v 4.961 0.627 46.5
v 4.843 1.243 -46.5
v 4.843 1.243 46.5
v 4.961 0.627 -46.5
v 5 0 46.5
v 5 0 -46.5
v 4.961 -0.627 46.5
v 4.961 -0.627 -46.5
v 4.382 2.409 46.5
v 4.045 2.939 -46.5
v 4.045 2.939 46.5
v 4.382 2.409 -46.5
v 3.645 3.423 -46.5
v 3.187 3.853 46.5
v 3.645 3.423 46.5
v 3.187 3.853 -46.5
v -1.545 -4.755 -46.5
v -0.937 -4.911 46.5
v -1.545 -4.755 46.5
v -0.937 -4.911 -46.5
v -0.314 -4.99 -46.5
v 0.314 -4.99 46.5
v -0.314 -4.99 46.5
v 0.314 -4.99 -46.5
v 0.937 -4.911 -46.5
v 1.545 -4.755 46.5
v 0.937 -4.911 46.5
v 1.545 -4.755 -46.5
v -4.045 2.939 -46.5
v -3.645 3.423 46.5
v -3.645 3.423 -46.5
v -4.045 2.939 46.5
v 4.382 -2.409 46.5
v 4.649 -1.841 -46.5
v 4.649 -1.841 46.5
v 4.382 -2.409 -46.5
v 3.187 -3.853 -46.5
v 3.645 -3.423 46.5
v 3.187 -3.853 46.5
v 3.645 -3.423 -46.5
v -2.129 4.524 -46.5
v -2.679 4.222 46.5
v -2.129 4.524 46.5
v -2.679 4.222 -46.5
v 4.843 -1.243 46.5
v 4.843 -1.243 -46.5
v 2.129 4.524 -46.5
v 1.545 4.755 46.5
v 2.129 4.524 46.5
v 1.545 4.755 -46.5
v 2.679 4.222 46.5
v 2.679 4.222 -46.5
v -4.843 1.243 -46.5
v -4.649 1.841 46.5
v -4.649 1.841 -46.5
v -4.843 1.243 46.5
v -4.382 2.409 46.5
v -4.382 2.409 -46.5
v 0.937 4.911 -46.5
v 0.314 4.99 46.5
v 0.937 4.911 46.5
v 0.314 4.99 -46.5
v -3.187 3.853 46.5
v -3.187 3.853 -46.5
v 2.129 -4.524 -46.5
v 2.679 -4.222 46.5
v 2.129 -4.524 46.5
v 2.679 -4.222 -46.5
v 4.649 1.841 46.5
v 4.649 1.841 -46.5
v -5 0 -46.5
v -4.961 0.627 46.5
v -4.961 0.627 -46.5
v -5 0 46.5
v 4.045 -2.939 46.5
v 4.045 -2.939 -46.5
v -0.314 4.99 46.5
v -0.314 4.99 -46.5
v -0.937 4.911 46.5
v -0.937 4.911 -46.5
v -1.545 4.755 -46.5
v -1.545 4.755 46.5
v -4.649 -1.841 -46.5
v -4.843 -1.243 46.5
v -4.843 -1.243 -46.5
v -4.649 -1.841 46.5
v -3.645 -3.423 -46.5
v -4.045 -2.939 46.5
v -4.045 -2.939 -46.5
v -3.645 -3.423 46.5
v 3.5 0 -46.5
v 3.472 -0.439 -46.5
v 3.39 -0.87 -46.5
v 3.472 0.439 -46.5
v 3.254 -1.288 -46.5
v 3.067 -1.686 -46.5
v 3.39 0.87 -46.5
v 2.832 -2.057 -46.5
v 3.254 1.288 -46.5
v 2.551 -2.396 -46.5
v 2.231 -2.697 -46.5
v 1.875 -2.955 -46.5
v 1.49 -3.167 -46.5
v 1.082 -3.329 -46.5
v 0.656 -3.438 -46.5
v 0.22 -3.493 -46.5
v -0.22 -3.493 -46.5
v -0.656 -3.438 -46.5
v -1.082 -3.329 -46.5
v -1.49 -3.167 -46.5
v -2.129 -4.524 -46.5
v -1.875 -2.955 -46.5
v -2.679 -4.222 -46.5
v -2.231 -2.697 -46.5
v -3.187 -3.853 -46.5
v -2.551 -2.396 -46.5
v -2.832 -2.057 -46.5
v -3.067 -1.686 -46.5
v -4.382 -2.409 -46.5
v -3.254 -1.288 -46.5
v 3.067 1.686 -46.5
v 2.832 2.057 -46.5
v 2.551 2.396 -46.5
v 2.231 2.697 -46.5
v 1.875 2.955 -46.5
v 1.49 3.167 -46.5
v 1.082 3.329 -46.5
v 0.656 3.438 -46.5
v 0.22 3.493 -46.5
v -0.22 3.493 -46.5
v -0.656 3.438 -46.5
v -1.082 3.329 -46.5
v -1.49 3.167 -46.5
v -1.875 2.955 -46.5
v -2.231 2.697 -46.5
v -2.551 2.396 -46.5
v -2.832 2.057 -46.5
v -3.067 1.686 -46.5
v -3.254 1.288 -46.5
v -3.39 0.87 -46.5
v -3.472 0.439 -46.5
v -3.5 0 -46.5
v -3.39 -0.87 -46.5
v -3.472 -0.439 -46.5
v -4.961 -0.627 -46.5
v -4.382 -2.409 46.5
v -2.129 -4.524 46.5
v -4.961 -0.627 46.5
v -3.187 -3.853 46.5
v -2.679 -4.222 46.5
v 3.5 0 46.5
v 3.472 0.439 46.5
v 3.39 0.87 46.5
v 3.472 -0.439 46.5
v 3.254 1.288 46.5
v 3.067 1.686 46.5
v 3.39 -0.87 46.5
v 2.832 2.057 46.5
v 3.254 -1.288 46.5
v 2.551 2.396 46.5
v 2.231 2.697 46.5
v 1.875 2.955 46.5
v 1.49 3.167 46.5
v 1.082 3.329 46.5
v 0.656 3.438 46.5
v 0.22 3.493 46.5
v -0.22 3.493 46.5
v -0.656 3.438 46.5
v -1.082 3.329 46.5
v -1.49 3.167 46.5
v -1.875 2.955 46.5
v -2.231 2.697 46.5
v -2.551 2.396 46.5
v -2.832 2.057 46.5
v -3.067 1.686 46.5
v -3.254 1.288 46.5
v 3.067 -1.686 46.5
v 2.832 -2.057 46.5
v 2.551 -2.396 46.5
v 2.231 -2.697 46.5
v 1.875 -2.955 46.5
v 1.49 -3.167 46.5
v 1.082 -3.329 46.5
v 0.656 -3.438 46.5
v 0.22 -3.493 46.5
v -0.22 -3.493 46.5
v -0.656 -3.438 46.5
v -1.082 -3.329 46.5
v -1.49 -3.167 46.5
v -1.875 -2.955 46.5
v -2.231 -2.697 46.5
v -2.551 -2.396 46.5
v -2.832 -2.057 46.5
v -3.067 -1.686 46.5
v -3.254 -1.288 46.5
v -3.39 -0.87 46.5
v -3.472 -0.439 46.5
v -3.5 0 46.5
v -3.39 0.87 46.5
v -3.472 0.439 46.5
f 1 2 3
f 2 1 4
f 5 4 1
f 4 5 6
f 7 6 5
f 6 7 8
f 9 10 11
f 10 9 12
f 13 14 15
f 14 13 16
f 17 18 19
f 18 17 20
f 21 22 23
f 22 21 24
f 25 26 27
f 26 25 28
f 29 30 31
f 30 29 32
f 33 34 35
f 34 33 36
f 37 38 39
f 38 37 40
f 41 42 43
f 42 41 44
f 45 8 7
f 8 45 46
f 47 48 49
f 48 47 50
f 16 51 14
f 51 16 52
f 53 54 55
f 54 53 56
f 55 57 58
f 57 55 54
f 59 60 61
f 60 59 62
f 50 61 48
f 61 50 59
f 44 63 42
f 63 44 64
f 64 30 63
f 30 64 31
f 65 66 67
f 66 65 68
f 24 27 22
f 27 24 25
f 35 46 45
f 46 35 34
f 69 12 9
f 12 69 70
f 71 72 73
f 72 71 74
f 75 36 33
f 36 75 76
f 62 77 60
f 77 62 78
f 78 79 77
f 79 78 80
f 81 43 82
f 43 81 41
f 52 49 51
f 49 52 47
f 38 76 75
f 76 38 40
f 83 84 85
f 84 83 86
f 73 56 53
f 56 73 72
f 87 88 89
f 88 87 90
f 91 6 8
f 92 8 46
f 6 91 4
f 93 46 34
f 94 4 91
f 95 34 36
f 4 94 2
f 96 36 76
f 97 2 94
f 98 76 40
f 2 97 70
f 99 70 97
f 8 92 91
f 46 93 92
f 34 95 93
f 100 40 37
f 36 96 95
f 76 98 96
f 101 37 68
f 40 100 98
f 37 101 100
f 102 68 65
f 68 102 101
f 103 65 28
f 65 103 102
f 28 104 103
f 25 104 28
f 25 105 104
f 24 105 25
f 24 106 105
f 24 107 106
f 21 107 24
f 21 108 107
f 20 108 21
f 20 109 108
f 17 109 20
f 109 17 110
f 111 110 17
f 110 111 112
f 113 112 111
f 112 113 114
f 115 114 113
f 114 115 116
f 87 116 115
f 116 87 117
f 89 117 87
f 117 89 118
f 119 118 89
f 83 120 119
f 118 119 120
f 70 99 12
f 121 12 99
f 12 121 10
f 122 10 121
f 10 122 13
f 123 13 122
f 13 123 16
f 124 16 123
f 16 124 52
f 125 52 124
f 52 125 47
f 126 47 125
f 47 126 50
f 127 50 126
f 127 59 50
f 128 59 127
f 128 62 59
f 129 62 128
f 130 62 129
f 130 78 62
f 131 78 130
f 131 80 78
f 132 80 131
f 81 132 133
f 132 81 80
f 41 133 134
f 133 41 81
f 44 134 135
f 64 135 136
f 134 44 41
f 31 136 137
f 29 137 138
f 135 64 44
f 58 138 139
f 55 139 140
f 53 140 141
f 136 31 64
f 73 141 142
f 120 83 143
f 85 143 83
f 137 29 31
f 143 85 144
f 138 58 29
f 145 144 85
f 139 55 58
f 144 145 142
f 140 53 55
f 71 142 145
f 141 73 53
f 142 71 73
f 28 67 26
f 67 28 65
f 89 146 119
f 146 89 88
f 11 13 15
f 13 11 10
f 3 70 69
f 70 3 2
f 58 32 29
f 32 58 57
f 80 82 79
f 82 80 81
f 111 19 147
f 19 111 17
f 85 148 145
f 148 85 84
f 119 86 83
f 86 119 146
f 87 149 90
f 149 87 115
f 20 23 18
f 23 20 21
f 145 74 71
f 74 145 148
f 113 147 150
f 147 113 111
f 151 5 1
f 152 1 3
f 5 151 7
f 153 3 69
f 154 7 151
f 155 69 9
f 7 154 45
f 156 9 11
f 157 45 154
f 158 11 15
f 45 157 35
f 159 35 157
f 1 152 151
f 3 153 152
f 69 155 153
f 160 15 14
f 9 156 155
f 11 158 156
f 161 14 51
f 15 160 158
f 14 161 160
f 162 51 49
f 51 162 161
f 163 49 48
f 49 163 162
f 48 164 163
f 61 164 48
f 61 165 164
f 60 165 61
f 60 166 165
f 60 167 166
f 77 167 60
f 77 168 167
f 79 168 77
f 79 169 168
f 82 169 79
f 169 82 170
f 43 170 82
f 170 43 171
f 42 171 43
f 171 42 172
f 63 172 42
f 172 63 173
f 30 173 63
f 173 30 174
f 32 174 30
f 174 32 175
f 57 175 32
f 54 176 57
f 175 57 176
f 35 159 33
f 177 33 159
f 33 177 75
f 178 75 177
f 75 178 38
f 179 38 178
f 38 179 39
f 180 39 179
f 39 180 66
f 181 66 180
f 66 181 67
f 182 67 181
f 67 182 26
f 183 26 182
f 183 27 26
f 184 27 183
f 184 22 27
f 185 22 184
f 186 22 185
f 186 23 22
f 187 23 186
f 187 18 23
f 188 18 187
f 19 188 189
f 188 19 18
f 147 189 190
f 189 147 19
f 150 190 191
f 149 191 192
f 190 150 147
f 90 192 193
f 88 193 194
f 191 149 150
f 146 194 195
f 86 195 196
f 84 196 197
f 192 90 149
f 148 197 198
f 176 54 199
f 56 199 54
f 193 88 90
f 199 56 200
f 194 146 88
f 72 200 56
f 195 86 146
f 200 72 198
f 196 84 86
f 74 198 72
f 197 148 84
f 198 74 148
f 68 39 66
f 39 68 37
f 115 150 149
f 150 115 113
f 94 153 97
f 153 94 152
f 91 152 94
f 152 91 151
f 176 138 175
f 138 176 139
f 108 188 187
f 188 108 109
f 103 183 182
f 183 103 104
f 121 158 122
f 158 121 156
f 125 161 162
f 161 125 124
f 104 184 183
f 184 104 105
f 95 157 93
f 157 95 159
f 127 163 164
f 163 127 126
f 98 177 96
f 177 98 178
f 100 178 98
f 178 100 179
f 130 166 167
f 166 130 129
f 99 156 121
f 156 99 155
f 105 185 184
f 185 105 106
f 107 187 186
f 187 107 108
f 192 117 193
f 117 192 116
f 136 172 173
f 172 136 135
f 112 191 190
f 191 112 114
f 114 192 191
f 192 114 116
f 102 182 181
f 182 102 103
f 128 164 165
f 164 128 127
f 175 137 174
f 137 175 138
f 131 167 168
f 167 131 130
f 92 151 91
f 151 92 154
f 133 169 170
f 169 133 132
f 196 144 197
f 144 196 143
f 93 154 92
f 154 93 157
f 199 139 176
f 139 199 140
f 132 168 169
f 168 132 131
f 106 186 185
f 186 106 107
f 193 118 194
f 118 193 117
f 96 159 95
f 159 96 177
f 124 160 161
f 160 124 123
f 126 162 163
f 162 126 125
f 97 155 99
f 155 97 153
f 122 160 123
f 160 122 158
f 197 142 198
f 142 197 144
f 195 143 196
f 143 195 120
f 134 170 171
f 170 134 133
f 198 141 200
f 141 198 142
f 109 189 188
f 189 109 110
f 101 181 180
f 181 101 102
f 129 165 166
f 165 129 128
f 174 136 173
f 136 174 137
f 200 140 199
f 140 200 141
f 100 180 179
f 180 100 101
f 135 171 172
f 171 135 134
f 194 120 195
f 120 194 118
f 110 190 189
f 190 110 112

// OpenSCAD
$fn = 50;


difference() {
	union() {
		translate(v = [0, 0, -46.5000000000]) {
			cylinder(h = 93, r = 5.0000000000);
		}
	}
	union() {
		translate(v = [0, 0, -100.0000000000]) {
			cylinder(h = 200, r = 3.5000000000);
		}
	}
}
